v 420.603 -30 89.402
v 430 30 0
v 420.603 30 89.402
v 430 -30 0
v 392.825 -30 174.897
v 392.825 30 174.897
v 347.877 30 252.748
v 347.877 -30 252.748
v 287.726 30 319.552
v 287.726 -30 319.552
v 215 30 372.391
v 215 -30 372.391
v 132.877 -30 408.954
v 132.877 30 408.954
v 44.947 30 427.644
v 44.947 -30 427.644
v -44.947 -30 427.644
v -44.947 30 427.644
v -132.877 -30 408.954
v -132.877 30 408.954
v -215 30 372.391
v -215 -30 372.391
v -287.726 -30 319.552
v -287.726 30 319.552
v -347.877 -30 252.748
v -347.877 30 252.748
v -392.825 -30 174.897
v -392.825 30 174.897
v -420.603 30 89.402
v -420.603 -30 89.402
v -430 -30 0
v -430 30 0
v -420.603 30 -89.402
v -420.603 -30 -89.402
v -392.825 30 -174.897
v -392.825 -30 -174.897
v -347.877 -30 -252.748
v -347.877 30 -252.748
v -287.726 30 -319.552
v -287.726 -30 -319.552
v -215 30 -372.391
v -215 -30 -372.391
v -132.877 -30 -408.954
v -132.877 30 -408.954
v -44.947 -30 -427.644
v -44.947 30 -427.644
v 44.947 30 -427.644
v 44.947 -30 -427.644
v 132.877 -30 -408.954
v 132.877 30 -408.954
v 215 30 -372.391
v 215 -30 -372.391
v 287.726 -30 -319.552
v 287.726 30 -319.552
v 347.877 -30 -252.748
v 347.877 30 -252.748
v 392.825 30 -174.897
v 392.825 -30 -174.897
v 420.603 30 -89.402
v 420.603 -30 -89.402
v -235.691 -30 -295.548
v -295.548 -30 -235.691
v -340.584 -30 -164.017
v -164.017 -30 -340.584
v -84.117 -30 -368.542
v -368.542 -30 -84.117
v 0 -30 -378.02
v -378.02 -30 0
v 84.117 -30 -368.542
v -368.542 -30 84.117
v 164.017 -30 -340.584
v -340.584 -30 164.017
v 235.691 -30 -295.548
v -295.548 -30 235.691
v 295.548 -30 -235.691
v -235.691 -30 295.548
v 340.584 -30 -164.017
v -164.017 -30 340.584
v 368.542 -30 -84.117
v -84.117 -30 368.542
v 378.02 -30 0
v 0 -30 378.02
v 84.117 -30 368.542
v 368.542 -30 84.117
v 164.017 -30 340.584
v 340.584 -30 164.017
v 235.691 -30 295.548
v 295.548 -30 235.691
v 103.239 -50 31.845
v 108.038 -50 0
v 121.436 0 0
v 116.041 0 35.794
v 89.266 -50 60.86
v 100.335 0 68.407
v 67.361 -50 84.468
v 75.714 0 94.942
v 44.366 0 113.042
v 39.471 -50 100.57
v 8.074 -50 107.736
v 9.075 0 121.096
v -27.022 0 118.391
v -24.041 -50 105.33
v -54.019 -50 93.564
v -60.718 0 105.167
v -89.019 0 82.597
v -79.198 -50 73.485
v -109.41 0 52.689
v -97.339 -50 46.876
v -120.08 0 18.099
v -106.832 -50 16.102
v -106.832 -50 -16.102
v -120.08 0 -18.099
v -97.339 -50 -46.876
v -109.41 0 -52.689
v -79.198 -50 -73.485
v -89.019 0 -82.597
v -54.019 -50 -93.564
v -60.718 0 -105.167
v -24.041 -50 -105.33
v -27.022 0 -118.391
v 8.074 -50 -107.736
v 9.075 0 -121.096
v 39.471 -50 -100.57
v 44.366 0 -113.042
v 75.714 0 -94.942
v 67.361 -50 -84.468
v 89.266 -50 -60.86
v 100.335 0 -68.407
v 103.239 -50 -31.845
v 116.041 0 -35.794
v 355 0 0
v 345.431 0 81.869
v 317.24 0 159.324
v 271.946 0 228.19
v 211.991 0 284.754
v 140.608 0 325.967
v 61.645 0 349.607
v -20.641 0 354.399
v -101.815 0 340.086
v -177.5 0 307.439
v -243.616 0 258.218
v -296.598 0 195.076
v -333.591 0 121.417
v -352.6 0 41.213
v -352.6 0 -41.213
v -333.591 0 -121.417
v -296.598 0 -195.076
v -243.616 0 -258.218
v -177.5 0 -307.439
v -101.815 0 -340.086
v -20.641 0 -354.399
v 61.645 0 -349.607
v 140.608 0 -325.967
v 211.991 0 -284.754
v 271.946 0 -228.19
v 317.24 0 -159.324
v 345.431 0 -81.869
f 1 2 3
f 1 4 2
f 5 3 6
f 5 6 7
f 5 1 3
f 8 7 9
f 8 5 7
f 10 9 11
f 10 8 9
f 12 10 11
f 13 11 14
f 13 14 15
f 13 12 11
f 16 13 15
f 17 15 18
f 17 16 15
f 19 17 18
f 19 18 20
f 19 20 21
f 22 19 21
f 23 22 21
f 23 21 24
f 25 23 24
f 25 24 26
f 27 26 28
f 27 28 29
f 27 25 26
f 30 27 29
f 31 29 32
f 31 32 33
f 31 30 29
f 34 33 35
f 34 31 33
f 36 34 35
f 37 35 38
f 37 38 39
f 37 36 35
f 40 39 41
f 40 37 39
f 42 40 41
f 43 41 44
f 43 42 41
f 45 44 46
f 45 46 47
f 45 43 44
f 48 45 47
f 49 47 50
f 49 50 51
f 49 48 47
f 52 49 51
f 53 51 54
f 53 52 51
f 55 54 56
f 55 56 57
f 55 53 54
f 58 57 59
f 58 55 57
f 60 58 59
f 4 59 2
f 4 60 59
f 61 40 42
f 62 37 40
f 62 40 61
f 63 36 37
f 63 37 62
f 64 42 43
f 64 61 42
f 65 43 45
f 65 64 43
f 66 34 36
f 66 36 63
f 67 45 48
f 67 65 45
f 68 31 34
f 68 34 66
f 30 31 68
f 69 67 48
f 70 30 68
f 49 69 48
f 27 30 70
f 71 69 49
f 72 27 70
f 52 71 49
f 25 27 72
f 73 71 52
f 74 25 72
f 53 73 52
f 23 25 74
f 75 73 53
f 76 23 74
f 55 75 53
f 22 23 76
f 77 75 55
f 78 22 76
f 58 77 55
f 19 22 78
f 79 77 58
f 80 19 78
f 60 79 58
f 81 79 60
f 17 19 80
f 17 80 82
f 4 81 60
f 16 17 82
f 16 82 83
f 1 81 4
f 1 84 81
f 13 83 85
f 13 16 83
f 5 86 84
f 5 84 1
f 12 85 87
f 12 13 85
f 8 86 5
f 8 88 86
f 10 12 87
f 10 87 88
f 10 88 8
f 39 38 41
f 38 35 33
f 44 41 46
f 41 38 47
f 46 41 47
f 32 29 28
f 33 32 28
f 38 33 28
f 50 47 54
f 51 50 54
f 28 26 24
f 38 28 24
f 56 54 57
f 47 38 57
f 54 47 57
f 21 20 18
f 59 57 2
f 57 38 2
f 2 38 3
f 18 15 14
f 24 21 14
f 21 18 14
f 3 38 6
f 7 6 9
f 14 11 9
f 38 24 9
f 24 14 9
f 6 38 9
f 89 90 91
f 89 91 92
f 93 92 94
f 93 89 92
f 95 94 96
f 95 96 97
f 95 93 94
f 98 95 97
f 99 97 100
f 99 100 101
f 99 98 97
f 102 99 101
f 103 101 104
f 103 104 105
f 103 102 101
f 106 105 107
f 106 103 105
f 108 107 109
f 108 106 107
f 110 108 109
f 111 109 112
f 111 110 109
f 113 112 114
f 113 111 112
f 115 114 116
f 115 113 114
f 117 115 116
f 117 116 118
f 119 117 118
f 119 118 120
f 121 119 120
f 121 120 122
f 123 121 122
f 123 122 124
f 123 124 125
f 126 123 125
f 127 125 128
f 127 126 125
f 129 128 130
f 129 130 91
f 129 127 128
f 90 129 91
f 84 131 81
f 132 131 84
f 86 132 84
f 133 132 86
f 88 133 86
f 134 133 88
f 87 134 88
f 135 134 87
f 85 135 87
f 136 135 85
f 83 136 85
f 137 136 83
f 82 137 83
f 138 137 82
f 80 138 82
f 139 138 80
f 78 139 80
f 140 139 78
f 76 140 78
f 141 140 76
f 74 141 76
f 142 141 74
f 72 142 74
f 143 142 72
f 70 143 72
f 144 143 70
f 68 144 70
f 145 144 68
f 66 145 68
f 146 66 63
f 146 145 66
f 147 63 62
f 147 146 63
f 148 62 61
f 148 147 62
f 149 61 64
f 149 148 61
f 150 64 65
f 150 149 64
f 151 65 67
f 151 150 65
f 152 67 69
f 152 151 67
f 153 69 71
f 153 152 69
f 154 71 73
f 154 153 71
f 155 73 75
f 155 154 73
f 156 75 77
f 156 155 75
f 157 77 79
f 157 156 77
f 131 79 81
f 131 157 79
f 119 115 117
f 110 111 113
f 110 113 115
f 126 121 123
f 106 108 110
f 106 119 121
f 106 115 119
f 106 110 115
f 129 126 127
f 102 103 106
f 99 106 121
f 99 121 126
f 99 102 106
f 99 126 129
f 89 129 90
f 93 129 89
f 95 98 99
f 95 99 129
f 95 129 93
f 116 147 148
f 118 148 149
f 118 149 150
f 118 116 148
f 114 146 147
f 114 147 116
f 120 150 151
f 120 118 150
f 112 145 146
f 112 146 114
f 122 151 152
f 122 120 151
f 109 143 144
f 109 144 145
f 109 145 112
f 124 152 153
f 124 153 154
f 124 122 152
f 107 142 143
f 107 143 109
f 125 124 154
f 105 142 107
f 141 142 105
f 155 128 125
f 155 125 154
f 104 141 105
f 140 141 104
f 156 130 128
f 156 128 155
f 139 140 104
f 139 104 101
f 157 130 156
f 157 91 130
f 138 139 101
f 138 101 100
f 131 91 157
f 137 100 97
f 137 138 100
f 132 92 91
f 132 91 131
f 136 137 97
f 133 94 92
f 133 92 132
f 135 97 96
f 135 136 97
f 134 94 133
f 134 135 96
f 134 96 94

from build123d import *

# Parameters (mm, degrees)
F0_R     = 430
F1_DEPTH = 30
F2_R     = 385
F2_R_2   = 100
F3_DEPTH = 30
F4_DEPTH = 20


# Not quite as in the source:
# - a fillet or chamfer that OpenCascade refuses, or shapes differently, is made with other operations: its cross-section is extruded or revolved along the edge and cut away or added


with BuildPart() as f1:
    # F0 (on Front) → F1 (new body, symmetric)
    with BuildSketch(Plane.XZ):
        Circle(F0_R)
    extrude(amount=F1_DEPTH, both=True)

    # F2 (on face) → F3 (cut)
    with BuildSketch(Plane.XZ.offset(30)):
        Circle(F2_R)
        Circle(F2_R_2, mode=Mode.SUBTRACT)
    extrude(amount=-F3_DEPTH, mode=Mode.SUBTRACT)

    # F4 (add): a face of the model
    f4_faces = [f1.faces().sort_by_distance(p)[0] for p in [
        (0, -30, 0),
    ]]
    extrude(f4_faces, amount=F4_DEPTH)

    # F5: chamfer of 80 x 21.4359353945 on 1 edges, made by hand


with BuildPart() as f5_tool2:
    # F5_s3 → F5_t4 (revolve)
    with BuildSketch(Plane.XY):
        Polygon((121.4359353945, 0), (100, -80), (100, 0), align=None)
    revolve(axis=Axis((0, 0, 0), (0, -1, 0)))

    split(bisect_by=Plane.XZ.offset(50), keep=Keep.BOTTOM)


with BuildPart() as f1_1:
    add(f1.part)

    # F5_t1: union F5_tool2
    add(f5_tool2.part)

    # F6: chamfer of 30 x 39.0967611852 on 1 edges, made by hand


with BuildPart() as f6_tool2:
    # F6_s3 → F6_t4 (revolve)
    with BuildSketch(Plane.XY):
        Polygon((385, -39.0967611852), (355, 0), (385, 0), align=None)
    revolve(axis=Axis((0, 0, 0), (0, -1, 0)))

    split(bisect_by=Plane.XZ.offset(30), keep=Keep.BOTTOM)


with BuildPart() as f1_2:
    add(f1_1.part)

    # F6_t1: union F6_tool2
    add(f6_tool2.part)


solid = f1_2.part
